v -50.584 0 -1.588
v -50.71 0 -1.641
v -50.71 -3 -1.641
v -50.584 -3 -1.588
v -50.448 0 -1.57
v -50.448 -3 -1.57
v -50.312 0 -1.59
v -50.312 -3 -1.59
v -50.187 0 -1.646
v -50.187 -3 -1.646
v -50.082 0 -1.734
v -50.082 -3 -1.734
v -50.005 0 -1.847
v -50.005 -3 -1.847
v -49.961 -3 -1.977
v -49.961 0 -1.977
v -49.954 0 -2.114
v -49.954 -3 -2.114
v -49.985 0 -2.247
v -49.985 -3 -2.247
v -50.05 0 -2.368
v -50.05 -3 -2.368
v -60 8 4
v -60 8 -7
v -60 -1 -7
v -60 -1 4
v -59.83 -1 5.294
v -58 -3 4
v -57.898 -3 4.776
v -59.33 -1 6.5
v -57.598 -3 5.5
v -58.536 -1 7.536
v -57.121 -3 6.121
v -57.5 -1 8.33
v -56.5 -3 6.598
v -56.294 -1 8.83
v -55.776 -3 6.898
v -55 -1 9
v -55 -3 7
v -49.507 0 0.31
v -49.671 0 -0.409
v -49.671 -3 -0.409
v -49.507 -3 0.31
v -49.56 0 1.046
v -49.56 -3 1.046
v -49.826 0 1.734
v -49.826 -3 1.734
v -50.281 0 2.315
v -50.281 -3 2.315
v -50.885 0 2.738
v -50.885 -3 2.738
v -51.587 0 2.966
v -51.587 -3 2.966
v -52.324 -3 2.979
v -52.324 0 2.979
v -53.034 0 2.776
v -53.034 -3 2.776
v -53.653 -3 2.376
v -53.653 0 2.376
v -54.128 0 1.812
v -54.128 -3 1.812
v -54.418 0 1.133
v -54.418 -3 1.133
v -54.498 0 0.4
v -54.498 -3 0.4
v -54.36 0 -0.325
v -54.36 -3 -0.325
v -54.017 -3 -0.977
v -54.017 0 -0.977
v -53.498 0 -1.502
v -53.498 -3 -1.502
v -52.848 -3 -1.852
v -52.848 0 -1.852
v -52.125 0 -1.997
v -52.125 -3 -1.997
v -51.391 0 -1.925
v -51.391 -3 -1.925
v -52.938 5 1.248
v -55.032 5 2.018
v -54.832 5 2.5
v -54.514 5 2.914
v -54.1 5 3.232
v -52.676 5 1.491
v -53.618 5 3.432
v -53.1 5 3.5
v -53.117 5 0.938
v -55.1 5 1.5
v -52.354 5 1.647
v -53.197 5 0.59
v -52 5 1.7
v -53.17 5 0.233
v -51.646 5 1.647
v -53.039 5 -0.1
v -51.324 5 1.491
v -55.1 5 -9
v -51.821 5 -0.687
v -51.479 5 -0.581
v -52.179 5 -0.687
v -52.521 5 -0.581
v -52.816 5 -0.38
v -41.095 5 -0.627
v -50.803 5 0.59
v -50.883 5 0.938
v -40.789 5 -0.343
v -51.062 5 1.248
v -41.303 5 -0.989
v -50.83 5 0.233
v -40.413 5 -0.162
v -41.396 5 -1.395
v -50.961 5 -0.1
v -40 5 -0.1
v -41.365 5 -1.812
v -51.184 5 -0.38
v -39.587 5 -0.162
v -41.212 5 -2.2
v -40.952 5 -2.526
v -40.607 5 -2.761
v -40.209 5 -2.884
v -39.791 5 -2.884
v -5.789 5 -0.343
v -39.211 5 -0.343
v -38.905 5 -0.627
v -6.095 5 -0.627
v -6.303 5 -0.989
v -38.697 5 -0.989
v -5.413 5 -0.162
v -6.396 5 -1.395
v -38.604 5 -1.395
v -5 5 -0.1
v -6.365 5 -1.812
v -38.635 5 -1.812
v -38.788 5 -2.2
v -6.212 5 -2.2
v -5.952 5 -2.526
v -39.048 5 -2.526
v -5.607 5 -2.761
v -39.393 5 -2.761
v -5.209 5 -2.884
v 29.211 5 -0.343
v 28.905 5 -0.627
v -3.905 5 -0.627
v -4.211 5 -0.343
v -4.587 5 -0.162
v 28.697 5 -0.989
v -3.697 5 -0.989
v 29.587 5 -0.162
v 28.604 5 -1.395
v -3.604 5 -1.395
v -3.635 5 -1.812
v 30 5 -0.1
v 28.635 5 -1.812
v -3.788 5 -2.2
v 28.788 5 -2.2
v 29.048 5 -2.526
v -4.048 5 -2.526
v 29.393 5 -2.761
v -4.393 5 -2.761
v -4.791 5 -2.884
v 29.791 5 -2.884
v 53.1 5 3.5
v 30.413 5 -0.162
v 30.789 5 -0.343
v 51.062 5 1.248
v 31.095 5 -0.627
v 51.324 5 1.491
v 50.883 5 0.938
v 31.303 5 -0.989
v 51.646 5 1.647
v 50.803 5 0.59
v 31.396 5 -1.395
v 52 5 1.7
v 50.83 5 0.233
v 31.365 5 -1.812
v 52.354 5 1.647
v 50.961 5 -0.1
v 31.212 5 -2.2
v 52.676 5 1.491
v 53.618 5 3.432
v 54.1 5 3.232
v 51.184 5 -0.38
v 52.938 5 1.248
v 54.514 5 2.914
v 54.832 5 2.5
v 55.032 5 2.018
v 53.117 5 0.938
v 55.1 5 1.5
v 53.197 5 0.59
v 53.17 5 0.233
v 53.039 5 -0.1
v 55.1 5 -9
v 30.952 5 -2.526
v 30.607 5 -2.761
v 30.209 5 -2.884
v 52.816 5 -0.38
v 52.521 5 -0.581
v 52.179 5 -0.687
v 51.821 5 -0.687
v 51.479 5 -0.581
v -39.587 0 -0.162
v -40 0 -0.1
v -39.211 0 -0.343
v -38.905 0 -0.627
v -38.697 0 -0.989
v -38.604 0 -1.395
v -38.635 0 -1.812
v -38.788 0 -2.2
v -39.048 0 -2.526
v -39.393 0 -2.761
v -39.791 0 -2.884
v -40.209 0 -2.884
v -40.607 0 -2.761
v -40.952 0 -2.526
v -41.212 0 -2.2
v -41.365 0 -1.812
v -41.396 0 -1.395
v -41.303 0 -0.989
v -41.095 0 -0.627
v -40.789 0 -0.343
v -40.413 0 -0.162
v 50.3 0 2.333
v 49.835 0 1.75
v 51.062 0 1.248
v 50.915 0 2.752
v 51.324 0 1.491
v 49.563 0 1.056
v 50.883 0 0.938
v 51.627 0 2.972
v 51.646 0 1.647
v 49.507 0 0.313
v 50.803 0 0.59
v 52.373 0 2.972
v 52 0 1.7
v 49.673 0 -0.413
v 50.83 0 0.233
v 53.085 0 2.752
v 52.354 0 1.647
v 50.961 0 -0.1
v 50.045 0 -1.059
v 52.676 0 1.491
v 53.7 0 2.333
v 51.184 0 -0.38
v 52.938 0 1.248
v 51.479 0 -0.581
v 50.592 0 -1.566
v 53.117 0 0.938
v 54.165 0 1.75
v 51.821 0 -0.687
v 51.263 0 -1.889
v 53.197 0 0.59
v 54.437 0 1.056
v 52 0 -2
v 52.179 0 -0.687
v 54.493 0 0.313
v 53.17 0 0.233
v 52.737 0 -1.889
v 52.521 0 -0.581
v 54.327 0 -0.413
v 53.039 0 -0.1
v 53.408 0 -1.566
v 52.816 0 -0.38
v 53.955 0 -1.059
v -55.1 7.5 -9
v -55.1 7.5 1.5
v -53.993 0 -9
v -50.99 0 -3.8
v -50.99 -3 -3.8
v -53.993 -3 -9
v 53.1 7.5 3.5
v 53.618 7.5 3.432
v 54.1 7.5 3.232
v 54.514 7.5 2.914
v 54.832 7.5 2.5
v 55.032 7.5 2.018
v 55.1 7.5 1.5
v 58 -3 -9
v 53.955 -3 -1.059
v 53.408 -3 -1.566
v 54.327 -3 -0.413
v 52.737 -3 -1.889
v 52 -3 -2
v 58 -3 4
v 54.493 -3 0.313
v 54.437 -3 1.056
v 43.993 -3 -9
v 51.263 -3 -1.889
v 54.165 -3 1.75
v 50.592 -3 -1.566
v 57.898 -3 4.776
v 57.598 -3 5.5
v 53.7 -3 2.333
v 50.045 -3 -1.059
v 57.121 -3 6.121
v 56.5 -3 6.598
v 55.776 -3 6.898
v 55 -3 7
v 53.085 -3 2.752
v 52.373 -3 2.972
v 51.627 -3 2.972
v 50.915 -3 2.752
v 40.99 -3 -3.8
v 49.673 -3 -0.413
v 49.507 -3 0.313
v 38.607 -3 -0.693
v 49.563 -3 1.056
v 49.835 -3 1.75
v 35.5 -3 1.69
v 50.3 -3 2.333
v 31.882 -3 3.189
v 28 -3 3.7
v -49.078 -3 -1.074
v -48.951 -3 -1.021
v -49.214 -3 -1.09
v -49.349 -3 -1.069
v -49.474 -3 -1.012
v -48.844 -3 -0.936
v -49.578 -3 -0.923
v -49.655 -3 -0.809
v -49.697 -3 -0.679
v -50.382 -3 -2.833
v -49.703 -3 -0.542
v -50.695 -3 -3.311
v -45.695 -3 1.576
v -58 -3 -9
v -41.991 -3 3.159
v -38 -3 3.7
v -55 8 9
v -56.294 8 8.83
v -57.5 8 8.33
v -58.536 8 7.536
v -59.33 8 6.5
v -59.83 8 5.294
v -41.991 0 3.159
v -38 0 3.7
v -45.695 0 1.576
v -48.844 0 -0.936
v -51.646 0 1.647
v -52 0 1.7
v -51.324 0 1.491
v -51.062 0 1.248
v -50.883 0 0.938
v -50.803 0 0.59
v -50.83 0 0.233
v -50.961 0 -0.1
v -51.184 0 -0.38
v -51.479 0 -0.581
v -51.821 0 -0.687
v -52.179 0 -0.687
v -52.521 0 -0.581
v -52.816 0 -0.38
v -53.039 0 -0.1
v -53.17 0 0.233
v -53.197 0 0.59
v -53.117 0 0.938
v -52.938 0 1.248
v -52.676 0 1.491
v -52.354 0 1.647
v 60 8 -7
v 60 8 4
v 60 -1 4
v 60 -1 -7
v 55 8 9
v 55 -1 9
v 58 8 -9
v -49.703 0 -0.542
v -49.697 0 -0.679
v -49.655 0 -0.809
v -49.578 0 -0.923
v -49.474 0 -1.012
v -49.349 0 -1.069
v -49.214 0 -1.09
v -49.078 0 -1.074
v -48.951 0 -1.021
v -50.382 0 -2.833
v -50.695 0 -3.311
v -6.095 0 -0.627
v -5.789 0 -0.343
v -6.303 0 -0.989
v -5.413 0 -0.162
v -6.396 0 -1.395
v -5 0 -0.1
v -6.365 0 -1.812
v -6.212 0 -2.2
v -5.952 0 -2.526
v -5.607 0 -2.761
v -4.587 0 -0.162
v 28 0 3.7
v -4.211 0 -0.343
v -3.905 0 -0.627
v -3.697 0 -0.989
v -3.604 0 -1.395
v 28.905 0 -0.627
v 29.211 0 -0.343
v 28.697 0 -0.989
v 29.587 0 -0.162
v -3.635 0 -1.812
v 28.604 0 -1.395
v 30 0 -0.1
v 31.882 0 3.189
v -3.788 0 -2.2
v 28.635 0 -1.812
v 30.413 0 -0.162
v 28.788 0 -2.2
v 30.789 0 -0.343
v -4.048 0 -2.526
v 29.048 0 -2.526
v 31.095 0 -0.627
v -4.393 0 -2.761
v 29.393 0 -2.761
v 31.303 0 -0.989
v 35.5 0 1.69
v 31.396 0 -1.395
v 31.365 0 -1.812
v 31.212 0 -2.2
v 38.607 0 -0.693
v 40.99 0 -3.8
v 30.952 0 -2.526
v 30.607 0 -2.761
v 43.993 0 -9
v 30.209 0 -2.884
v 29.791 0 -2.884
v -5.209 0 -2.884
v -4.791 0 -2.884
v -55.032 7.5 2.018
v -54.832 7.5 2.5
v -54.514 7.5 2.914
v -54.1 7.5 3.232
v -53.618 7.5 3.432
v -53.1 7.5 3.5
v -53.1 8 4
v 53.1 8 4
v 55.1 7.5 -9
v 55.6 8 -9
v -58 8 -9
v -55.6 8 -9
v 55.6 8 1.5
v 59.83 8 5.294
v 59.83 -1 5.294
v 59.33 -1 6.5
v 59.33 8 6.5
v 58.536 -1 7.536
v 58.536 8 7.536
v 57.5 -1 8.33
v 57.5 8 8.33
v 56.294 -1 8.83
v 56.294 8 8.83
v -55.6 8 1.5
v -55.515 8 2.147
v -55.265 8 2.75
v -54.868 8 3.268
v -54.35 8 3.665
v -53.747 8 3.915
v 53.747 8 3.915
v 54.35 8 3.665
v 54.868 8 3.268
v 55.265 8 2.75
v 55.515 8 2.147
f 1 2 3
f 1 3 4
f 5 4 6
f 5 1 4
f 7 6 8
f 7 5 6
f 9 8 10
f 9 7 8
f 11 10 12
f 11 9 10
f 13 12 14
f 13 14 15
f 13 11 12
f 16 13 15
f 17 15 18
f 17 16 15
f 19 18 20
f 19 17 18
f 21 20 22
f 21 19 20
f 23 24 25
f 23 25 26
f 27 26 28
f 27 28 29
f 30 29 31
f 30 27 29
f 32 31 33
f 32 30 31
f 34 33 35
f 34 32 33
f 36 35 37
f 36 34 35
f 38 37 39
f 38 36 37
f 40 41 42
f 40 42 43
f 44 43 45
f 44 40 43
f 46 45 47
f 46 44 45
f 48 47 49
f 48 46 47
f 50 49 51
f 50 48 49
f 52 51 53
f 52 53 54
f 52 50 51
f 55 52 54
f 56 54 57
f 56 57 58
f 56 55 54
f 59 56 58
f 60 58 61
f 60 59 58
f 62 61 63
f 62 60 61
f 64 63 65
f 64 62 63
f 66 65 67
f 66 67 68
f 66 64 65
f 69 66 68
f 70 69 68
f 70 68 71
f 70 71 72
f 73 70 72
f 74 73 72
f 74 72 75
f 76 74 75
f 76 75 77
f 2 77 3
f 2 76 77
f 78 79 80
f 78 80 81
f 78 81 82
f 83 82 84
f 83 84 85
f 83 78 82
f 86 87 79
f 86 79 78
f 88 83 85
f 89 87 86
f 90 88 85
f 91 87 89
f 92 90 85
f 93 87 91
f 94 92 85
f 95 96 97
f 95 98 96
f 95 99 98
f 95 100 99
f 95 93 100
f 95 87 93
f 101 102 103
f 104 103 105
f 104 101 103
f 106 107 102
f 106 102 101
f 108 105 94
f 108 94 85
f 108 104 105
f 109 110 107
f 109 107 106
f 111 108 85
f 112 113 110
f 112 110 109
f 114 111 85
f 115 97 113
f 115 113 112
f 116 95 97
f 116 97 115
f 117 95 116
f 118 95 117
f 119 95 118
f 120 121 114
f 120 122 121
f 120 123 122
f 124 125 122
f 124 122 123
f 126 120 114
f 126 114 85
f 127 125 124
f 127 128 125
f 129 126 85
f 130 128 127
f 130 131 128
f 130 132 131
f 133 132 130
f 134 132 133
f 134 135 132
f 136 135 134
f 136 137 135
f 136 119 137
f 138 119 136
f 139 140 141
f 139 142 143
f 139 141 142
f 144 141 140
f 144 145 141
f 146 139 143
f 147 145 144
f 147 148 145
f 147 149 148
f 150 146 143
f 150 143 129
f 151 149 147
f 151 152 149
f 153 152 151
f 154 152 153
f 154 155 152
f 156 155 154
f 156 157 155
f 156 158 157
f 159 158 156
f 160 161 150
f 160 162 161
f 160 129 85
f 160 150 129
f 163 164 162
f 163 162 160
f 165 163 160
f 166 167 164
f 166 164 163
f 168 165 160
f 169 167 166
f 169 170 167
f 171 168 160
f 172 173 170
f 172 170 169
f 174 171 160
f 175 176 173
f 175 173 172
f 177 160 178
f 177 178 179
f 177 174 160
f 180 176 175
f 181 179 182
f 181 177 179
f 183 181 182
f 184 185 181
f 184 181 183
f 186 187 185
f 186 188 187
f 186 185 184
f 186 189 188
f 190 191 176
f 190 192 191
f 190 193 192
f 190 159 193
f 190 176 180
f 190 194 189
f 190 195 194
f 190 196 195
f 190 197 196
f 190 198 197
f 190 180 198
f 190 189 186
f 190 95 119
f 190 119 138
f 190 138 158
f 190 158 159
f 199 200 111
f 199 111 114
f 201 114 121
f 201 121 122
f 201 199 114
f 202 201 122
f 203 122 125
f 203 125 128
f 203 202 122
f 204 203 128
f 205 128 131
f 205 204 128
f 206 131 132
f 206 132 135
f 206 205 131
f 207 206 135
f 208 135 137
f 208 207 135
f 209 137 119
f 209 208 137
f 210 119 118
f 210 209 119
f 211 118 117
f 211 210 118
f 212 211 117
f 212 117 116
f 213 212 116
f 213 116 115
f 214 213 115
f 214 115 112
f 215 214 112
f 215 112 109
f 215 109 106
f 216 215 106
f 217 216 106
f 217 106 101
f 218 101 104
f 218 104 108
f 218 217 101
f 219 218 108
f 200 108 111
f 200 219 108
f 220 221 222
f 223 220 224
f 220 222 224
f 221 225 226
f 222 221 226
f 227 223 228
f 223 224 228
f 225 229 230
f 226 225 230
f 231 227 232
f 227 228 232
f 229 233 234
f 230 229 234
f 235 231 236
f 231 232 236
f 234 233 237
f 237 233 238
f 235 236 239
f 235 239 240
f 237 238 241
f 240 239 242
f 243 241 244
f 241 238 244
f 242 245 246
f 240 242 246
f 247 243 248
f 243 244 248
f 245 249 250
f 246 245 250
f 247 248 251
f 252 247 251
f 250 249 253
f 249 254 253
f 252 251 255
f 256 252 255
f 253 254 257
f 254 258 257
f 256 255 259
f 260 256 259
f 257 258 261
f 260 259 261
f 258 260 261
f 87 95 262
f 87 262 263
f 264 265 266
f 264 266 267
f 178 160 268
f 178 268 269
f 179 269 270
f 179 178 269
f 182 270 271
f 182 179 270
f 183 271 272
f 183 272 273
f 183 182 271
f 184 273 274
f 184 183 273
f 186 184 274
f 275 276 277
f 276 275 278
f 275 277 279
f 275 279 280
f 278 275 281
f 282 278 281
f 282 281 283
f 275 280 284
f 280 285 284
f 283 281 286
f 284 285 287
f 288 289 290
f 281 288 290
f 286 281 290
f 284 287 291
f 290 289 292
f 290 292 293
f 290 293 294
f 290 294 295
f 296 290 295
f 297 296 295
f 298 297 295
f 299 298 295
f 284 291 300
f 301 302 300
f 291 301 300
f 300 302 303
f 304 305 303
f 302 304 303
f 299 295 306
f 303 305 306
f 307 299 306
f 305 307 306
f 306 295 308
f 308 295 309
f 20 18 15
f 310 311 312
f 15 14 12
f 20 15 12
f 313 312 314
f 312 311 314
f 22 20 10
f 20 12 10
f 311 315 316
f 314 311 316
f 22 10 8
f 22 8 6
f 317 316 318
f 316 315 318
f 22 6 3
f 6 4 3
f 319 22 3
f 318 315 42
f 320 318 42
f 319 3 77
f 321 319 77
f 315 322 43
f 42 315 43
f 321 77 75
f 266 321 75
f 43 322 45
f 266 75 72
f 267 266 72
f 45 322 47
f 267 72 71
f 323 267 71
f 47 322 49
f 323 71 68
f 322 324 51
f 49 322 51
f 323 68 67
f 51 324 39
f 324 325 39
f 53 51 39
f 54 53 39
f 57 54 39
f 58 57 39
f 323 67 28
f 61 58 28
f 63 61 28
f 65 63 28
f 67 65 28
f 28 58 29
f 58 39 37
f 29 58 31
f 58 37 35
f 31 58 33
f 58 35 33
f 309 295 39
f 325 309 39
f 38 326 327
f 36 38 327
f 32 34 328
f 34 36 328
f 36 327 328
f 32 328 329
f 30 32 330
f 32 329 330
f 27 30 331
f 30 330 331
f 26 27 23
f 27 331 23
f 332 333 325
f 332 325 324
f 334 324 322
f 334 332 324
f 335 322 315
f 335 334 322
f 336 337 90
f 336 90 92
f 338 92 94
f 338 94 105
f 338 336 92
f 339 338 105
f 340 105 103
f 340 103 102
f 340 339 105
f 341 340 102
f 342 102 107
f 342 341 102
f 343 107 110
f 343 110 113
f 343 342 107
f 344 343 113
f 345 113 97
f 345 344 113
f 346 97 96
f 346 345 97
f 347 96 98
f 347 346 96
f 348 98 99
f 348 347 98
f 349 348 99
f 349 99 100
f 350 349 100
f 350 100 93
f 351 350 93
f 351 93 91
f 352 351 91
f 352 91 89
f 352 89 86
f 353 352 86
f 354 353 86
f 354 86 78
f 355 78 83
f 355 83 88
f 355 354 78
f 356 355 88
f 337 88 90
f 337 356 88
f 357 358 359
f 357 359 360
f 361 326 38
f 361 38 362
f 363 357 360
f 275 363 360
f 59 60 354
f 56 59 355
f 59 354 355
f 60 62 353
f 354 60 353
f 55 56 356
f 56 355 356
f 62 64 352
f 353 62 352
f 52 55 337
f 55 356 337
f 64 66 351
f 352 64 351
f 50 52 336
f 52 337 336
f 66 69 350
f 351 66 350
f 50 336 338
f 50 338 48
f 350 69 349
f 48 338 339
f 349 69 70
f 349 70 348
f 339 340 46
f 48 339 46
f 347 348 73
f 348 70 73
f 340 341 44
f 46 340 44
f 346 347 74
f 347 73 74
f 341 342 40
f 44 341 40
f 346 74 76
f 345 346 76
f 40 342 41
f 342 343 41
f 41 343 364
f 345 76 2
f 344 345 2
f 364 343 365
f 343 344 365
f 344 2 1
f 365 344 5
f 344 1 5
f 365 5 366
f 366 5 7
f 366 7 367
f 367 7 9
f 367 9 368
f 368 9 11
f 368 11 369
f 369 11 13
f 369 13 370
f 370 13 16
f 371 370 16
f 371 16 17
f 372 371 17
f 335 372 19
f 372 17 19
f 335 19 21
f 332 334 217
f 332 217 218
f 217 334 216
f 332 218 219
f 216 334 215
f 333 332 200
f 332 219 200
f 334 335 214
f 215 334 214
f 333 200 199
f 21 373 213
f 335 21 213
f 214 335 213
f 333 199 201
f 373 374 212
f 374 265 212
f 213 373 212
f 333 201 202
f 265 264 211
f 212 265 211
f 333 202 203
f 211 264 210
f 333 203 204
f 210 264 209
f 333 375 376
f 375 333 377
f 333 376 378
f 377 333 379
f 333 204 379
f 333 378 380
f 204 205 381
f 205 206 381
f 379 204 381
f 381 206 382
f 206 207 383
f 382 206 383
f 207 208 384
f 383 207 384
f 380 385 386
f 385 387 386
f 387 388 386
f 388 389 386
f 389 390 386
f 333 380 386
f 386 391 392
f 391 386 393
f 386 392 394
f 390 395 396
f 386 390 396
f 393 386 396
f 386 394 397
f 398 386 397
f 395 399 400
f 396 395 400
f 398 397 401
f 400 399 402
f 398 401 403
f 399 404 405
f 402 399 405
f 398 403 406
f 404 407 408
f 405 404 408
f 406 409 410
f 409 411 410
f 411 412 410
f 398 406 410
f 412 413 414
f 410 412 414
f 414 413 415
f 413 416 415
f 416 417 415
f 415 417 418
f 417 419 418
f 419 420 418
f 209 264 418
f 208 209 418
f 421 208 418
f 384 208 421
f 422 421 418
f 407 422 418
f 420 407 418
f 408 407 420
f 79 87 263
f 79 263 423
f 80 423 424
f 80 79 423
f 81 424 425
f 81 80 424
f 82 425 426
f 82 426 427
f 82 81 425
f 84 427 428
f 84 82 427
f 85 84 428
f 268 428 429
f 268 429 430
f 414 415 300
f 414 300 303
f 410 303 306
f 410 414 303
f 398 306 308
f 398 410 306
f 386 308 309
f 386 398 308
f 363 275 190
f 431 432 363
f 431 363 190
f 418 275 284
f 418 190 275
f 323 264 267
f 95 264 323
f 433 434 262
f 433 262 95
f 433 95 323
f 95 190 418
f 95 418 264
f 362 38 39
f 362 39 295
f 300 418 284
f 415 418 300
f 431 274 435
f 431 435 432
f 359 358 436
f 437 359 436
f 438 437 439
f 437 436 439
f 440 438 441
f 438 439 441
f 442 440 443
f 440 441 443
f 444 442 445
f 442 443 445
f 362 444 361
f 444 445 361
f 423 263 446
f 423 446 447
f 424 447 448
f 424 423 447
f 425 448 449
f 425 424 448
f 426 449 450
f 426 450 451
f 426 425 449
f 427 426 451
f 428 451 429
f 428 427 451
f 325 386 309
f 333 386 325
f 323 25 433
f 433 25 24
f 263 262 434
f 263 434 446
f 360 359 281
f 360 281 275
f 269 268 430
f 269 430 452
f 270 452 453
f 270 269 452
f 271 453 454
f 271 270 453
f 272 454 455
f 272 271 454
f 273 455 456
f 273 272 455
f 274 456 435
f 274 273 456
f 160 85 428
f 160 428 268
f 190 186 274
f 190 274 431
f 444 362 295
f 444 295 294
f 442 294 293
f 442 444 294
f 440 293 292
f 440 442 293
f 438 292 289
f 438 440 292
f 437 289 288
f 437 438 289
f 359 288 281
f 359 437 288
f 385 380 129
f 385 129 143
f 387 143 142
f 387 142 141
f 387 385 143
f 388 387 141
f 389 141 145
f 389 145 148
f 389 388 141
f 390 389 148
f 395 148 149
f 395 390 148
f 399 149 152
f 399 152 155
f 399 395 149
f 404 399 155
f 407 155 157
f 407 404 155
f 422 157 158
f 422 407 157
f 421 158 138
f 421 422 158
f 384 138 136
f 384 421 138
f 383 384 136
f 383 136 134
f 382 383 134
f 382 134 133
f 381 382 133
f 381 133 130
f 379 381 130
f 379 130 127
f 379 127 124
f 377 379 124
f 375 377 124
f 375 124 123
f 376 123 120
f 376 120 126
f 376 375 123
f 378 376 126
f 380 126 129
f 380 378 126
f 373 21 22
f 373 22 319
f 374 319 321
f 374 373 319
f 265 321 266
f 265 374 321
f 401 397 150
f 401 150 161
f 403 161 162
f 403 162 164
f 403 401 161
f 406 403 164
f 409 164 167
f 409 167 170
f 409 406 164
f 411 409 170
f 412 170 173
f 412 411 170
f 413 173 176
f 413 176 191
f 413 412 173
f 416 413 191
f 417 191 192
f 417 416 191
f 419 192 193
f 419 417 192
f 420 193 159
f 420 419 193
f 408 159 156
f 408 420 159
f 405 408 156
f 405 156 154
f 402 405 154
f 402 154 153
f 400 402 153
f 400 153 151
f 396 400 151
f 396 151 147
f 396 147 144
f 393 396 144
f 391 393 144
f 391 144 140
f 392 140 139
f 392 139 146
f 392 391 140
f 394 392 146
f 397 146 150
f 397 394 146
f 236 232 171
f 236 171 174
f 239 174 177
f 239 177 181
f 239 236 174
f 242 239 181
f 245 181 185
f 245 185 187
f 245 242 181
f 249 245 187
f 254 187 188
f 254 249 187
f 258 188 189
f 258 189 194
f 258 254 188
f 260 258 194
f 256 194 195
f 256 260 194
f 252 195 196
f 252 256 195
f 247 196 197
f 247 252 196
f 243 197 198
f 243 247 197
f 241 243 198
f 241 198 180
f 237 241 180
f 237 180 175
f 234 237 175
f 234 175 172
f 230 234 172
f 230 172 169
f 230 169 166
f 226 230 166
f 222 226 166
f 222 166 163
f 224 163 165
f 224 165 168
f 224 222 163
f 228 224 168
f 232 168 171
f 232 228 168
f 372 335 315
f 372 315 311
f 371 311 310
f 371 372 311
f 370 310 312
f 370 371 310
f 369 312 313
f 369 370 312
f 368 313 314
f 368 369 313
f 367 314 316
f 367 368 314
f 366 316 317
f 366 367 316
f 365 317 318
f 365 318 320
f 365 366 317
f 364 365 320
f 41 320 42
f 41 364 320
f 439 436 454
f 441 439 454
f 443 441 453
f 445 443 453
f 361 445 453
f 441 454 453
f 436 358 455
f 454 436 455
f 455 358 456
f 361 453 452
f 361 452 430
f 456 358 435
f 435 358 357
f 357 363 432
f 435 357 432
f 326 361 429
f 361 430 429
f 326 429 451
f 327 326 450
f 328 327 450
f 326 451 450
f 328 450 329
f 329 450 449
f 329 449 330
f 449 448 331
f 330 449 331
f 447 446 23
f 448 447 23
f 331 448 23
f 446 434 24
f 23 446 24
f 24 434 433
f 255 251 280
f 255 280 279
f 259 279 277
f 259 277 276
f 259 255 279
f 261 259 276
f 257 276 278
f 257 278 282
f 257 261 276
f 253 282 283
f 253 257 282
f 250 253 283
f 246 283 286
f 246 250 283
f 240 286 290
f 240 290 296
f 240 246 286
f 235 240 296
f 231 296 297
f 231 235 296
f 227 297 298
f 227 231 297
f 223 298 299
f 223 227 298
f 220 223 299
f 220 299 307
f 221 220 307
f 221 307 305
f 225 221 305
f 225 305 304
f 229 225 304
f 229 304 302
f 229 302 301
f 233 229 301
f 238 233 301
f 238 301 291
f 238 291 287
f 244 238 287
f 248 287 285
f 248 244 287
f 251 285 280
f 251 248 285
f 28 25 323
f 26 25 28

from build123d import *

# Parameters (mm, degrees)
SKETCH_1_W      = 120
SKETCH_1_H      = 18
SKETCH_1_R      = 1.4
SKETCH_1_R_2    = 1.2
EXTRUDE_1_DEPTH = 5
EXTRUDE_2_DEPTH = 3
SKETCH_3_R      = 2.5
EXTRUDE_3_DEPTH = 3
FILLET_1_R      = 5
CHAMFER_1_SIZE  = 0.5
CHAMFER_2_SIZE  = 2
CHAMFER_3_SIZE  = 2


with BuildPart() as part:
    # 草图1 → 凸台-拉伸1 (new body)
    with BuildSketch(Plane(origin=(0, 0, 0), x_dir=(1, 0, 0), z_dir=(0, 1, 0))):
        Rectangle(SKETCH_1_W, SKETCH_1_H)
        with Locations((30, 1.5)):
            Circle(SKETCH_1_R, mode=Mode.SUBTRACT)
        with Locations((-5, 1.5)):
            Circle(SKETCH_1_R, mode=Mode.SUBTRACT)
        with Locations((-40, 1.5)):
            Circle(SKETCH_1_R, mode=Mode.SUBTRACT)
        with Locations((52, -0.5)):
            Circle(SKETCH_1_R_2, mode=Mode.SUBTRACT)
        with Locations((-52, -0.5)):
            Circle(SKETCH_1_R_2, mode=Mode.SUBTRACT)
    extrude(amount=EXTRUDE_1_DEPTH)

    # 草图2 → 凸台-拉伸2 (add)
    with BuildSketch(Plane(origin=(0, 5, 0), x_dir=(1, 0, 0), z_dir=(0, 1, 0))):
        with BuildLine():
            Line((-55.1, 9), (-55.1, -1.5))
            ThreePointArc((-55.1, -1.5), (-54.514213562, -2.914213562), (-53.1, -3.5))
            Line((-53.1, -3.5), (53.1, -3.5))
            ThreePointArc((53.1, -3.5), (54.514213562, -2.914213562), (55.1, -1.5))
            Line((55.1, -1.5), (55.1, 9))
            Line((55.1, 9), (60, 9))
            Line((60, 9), (60, -9))
            Line((60, -9), (-60, -9))
            Line((-60, -9), (-60, 9))
            Line((-60, 9), (-55.1, 9))
        make_face()
    extrude(amount=EXTRUDE_2_DEPTH)

    # 草图3 → 凸台-拉伸3 (add)
    with BuildSketch(Plane.XZ):
        with BuildLine():
            Line((-50.990381057, -3.8), (-53.992602457, -9))
            Line((-53.992602457, -9), (-60, -9))
            Line((-60, -9), (-60, 9))
            Line((-60, 9), (60, 9))
            Line((60, 9), (60, -9))
            Line((60, -9), (43.992602457, -9))
            Line((43.992602457, -9), (40.990381057, -3.8))
            ThreePointArc((40.990381057, -3.8), (35.5, 1.690381057), (28, 3.7))
            Line((28, 3.7), (-38, 3.7))
            ThreePointArc((-38, 3.7), (-43.896602634, 2.492392011), (-48.843767341, -0.935989683))
            ThreePointArc((-48.843767341, -0.935989683), (-49.473949116, -1.012171842), (-49.671021877, -0.408768893))
            ThreePointArc((-49.671021877, -0.408768893), (-53.911569658, 2.11118014), (-50.710028515, -1.641488634))
            ThreePointArc((-50.710028515, -1.641488634), (-50.081970455, -1.733553091), (-50.050355695, -2.367535187))
            ThreePointArc((-50.050355695, -2.367535187), (-50.540837816, -3.070334948), (-50.990381057, -3.8))
        make_face()
        with Locations((52, 0.5)):
            Circle(SKETCH_3_R, mode=Mode.SUBTRACT)
    extrude(amount=EXTRUDE_3_DEPTH)

    # 圆角1
    fillet_1_edges = [part.edges().sort_by_distance(p)[0] for p in [
        (60, 2.5, 9),
        (-60, 2.5, 9),
    ]]
    fillet(fillet_1_edges, radius=FILLET_1_R)

    # 倒角1
    chamfer_1_edges = [part.edges().sort_by_distance(p)[0] for p in [
        (55.1, 8, -3.75),
        (-55.1, 8, -3.75),
        (54.514213562, 8, 2.914213562),
        (-54.514213562, 8, 2.914213562),
        (0, 8, 3.5),
    ]]
    chamfer(chamfer_1_edges, length=CHAMFER_1_SIZE)

    # 倒角2
    chamfer_2_edges = [part.edges().sort_by_distance(p)[0] for p in [
        (-60, 2.5, -9),
        (60, 2.5, -9),
    ]]
    chamfer(chamfer_2_edges, length=CHAMFER_2_SIZE)

    # 倒角3
    chamfer_3_edges = [part.edges().sort_by_distance(p)[0] for p in [
        (60, -3, -1.5),
        (-60, -3, -1.5),
        (58.535533906, -3, 7.535533906),
        (-58.535533906, -3, 7.535533906),
        (0, -3, 9),
    ]]
    chamfer(chamfer_3_edges, length=CHAMFER_3_SIZE)


solid = part.part
